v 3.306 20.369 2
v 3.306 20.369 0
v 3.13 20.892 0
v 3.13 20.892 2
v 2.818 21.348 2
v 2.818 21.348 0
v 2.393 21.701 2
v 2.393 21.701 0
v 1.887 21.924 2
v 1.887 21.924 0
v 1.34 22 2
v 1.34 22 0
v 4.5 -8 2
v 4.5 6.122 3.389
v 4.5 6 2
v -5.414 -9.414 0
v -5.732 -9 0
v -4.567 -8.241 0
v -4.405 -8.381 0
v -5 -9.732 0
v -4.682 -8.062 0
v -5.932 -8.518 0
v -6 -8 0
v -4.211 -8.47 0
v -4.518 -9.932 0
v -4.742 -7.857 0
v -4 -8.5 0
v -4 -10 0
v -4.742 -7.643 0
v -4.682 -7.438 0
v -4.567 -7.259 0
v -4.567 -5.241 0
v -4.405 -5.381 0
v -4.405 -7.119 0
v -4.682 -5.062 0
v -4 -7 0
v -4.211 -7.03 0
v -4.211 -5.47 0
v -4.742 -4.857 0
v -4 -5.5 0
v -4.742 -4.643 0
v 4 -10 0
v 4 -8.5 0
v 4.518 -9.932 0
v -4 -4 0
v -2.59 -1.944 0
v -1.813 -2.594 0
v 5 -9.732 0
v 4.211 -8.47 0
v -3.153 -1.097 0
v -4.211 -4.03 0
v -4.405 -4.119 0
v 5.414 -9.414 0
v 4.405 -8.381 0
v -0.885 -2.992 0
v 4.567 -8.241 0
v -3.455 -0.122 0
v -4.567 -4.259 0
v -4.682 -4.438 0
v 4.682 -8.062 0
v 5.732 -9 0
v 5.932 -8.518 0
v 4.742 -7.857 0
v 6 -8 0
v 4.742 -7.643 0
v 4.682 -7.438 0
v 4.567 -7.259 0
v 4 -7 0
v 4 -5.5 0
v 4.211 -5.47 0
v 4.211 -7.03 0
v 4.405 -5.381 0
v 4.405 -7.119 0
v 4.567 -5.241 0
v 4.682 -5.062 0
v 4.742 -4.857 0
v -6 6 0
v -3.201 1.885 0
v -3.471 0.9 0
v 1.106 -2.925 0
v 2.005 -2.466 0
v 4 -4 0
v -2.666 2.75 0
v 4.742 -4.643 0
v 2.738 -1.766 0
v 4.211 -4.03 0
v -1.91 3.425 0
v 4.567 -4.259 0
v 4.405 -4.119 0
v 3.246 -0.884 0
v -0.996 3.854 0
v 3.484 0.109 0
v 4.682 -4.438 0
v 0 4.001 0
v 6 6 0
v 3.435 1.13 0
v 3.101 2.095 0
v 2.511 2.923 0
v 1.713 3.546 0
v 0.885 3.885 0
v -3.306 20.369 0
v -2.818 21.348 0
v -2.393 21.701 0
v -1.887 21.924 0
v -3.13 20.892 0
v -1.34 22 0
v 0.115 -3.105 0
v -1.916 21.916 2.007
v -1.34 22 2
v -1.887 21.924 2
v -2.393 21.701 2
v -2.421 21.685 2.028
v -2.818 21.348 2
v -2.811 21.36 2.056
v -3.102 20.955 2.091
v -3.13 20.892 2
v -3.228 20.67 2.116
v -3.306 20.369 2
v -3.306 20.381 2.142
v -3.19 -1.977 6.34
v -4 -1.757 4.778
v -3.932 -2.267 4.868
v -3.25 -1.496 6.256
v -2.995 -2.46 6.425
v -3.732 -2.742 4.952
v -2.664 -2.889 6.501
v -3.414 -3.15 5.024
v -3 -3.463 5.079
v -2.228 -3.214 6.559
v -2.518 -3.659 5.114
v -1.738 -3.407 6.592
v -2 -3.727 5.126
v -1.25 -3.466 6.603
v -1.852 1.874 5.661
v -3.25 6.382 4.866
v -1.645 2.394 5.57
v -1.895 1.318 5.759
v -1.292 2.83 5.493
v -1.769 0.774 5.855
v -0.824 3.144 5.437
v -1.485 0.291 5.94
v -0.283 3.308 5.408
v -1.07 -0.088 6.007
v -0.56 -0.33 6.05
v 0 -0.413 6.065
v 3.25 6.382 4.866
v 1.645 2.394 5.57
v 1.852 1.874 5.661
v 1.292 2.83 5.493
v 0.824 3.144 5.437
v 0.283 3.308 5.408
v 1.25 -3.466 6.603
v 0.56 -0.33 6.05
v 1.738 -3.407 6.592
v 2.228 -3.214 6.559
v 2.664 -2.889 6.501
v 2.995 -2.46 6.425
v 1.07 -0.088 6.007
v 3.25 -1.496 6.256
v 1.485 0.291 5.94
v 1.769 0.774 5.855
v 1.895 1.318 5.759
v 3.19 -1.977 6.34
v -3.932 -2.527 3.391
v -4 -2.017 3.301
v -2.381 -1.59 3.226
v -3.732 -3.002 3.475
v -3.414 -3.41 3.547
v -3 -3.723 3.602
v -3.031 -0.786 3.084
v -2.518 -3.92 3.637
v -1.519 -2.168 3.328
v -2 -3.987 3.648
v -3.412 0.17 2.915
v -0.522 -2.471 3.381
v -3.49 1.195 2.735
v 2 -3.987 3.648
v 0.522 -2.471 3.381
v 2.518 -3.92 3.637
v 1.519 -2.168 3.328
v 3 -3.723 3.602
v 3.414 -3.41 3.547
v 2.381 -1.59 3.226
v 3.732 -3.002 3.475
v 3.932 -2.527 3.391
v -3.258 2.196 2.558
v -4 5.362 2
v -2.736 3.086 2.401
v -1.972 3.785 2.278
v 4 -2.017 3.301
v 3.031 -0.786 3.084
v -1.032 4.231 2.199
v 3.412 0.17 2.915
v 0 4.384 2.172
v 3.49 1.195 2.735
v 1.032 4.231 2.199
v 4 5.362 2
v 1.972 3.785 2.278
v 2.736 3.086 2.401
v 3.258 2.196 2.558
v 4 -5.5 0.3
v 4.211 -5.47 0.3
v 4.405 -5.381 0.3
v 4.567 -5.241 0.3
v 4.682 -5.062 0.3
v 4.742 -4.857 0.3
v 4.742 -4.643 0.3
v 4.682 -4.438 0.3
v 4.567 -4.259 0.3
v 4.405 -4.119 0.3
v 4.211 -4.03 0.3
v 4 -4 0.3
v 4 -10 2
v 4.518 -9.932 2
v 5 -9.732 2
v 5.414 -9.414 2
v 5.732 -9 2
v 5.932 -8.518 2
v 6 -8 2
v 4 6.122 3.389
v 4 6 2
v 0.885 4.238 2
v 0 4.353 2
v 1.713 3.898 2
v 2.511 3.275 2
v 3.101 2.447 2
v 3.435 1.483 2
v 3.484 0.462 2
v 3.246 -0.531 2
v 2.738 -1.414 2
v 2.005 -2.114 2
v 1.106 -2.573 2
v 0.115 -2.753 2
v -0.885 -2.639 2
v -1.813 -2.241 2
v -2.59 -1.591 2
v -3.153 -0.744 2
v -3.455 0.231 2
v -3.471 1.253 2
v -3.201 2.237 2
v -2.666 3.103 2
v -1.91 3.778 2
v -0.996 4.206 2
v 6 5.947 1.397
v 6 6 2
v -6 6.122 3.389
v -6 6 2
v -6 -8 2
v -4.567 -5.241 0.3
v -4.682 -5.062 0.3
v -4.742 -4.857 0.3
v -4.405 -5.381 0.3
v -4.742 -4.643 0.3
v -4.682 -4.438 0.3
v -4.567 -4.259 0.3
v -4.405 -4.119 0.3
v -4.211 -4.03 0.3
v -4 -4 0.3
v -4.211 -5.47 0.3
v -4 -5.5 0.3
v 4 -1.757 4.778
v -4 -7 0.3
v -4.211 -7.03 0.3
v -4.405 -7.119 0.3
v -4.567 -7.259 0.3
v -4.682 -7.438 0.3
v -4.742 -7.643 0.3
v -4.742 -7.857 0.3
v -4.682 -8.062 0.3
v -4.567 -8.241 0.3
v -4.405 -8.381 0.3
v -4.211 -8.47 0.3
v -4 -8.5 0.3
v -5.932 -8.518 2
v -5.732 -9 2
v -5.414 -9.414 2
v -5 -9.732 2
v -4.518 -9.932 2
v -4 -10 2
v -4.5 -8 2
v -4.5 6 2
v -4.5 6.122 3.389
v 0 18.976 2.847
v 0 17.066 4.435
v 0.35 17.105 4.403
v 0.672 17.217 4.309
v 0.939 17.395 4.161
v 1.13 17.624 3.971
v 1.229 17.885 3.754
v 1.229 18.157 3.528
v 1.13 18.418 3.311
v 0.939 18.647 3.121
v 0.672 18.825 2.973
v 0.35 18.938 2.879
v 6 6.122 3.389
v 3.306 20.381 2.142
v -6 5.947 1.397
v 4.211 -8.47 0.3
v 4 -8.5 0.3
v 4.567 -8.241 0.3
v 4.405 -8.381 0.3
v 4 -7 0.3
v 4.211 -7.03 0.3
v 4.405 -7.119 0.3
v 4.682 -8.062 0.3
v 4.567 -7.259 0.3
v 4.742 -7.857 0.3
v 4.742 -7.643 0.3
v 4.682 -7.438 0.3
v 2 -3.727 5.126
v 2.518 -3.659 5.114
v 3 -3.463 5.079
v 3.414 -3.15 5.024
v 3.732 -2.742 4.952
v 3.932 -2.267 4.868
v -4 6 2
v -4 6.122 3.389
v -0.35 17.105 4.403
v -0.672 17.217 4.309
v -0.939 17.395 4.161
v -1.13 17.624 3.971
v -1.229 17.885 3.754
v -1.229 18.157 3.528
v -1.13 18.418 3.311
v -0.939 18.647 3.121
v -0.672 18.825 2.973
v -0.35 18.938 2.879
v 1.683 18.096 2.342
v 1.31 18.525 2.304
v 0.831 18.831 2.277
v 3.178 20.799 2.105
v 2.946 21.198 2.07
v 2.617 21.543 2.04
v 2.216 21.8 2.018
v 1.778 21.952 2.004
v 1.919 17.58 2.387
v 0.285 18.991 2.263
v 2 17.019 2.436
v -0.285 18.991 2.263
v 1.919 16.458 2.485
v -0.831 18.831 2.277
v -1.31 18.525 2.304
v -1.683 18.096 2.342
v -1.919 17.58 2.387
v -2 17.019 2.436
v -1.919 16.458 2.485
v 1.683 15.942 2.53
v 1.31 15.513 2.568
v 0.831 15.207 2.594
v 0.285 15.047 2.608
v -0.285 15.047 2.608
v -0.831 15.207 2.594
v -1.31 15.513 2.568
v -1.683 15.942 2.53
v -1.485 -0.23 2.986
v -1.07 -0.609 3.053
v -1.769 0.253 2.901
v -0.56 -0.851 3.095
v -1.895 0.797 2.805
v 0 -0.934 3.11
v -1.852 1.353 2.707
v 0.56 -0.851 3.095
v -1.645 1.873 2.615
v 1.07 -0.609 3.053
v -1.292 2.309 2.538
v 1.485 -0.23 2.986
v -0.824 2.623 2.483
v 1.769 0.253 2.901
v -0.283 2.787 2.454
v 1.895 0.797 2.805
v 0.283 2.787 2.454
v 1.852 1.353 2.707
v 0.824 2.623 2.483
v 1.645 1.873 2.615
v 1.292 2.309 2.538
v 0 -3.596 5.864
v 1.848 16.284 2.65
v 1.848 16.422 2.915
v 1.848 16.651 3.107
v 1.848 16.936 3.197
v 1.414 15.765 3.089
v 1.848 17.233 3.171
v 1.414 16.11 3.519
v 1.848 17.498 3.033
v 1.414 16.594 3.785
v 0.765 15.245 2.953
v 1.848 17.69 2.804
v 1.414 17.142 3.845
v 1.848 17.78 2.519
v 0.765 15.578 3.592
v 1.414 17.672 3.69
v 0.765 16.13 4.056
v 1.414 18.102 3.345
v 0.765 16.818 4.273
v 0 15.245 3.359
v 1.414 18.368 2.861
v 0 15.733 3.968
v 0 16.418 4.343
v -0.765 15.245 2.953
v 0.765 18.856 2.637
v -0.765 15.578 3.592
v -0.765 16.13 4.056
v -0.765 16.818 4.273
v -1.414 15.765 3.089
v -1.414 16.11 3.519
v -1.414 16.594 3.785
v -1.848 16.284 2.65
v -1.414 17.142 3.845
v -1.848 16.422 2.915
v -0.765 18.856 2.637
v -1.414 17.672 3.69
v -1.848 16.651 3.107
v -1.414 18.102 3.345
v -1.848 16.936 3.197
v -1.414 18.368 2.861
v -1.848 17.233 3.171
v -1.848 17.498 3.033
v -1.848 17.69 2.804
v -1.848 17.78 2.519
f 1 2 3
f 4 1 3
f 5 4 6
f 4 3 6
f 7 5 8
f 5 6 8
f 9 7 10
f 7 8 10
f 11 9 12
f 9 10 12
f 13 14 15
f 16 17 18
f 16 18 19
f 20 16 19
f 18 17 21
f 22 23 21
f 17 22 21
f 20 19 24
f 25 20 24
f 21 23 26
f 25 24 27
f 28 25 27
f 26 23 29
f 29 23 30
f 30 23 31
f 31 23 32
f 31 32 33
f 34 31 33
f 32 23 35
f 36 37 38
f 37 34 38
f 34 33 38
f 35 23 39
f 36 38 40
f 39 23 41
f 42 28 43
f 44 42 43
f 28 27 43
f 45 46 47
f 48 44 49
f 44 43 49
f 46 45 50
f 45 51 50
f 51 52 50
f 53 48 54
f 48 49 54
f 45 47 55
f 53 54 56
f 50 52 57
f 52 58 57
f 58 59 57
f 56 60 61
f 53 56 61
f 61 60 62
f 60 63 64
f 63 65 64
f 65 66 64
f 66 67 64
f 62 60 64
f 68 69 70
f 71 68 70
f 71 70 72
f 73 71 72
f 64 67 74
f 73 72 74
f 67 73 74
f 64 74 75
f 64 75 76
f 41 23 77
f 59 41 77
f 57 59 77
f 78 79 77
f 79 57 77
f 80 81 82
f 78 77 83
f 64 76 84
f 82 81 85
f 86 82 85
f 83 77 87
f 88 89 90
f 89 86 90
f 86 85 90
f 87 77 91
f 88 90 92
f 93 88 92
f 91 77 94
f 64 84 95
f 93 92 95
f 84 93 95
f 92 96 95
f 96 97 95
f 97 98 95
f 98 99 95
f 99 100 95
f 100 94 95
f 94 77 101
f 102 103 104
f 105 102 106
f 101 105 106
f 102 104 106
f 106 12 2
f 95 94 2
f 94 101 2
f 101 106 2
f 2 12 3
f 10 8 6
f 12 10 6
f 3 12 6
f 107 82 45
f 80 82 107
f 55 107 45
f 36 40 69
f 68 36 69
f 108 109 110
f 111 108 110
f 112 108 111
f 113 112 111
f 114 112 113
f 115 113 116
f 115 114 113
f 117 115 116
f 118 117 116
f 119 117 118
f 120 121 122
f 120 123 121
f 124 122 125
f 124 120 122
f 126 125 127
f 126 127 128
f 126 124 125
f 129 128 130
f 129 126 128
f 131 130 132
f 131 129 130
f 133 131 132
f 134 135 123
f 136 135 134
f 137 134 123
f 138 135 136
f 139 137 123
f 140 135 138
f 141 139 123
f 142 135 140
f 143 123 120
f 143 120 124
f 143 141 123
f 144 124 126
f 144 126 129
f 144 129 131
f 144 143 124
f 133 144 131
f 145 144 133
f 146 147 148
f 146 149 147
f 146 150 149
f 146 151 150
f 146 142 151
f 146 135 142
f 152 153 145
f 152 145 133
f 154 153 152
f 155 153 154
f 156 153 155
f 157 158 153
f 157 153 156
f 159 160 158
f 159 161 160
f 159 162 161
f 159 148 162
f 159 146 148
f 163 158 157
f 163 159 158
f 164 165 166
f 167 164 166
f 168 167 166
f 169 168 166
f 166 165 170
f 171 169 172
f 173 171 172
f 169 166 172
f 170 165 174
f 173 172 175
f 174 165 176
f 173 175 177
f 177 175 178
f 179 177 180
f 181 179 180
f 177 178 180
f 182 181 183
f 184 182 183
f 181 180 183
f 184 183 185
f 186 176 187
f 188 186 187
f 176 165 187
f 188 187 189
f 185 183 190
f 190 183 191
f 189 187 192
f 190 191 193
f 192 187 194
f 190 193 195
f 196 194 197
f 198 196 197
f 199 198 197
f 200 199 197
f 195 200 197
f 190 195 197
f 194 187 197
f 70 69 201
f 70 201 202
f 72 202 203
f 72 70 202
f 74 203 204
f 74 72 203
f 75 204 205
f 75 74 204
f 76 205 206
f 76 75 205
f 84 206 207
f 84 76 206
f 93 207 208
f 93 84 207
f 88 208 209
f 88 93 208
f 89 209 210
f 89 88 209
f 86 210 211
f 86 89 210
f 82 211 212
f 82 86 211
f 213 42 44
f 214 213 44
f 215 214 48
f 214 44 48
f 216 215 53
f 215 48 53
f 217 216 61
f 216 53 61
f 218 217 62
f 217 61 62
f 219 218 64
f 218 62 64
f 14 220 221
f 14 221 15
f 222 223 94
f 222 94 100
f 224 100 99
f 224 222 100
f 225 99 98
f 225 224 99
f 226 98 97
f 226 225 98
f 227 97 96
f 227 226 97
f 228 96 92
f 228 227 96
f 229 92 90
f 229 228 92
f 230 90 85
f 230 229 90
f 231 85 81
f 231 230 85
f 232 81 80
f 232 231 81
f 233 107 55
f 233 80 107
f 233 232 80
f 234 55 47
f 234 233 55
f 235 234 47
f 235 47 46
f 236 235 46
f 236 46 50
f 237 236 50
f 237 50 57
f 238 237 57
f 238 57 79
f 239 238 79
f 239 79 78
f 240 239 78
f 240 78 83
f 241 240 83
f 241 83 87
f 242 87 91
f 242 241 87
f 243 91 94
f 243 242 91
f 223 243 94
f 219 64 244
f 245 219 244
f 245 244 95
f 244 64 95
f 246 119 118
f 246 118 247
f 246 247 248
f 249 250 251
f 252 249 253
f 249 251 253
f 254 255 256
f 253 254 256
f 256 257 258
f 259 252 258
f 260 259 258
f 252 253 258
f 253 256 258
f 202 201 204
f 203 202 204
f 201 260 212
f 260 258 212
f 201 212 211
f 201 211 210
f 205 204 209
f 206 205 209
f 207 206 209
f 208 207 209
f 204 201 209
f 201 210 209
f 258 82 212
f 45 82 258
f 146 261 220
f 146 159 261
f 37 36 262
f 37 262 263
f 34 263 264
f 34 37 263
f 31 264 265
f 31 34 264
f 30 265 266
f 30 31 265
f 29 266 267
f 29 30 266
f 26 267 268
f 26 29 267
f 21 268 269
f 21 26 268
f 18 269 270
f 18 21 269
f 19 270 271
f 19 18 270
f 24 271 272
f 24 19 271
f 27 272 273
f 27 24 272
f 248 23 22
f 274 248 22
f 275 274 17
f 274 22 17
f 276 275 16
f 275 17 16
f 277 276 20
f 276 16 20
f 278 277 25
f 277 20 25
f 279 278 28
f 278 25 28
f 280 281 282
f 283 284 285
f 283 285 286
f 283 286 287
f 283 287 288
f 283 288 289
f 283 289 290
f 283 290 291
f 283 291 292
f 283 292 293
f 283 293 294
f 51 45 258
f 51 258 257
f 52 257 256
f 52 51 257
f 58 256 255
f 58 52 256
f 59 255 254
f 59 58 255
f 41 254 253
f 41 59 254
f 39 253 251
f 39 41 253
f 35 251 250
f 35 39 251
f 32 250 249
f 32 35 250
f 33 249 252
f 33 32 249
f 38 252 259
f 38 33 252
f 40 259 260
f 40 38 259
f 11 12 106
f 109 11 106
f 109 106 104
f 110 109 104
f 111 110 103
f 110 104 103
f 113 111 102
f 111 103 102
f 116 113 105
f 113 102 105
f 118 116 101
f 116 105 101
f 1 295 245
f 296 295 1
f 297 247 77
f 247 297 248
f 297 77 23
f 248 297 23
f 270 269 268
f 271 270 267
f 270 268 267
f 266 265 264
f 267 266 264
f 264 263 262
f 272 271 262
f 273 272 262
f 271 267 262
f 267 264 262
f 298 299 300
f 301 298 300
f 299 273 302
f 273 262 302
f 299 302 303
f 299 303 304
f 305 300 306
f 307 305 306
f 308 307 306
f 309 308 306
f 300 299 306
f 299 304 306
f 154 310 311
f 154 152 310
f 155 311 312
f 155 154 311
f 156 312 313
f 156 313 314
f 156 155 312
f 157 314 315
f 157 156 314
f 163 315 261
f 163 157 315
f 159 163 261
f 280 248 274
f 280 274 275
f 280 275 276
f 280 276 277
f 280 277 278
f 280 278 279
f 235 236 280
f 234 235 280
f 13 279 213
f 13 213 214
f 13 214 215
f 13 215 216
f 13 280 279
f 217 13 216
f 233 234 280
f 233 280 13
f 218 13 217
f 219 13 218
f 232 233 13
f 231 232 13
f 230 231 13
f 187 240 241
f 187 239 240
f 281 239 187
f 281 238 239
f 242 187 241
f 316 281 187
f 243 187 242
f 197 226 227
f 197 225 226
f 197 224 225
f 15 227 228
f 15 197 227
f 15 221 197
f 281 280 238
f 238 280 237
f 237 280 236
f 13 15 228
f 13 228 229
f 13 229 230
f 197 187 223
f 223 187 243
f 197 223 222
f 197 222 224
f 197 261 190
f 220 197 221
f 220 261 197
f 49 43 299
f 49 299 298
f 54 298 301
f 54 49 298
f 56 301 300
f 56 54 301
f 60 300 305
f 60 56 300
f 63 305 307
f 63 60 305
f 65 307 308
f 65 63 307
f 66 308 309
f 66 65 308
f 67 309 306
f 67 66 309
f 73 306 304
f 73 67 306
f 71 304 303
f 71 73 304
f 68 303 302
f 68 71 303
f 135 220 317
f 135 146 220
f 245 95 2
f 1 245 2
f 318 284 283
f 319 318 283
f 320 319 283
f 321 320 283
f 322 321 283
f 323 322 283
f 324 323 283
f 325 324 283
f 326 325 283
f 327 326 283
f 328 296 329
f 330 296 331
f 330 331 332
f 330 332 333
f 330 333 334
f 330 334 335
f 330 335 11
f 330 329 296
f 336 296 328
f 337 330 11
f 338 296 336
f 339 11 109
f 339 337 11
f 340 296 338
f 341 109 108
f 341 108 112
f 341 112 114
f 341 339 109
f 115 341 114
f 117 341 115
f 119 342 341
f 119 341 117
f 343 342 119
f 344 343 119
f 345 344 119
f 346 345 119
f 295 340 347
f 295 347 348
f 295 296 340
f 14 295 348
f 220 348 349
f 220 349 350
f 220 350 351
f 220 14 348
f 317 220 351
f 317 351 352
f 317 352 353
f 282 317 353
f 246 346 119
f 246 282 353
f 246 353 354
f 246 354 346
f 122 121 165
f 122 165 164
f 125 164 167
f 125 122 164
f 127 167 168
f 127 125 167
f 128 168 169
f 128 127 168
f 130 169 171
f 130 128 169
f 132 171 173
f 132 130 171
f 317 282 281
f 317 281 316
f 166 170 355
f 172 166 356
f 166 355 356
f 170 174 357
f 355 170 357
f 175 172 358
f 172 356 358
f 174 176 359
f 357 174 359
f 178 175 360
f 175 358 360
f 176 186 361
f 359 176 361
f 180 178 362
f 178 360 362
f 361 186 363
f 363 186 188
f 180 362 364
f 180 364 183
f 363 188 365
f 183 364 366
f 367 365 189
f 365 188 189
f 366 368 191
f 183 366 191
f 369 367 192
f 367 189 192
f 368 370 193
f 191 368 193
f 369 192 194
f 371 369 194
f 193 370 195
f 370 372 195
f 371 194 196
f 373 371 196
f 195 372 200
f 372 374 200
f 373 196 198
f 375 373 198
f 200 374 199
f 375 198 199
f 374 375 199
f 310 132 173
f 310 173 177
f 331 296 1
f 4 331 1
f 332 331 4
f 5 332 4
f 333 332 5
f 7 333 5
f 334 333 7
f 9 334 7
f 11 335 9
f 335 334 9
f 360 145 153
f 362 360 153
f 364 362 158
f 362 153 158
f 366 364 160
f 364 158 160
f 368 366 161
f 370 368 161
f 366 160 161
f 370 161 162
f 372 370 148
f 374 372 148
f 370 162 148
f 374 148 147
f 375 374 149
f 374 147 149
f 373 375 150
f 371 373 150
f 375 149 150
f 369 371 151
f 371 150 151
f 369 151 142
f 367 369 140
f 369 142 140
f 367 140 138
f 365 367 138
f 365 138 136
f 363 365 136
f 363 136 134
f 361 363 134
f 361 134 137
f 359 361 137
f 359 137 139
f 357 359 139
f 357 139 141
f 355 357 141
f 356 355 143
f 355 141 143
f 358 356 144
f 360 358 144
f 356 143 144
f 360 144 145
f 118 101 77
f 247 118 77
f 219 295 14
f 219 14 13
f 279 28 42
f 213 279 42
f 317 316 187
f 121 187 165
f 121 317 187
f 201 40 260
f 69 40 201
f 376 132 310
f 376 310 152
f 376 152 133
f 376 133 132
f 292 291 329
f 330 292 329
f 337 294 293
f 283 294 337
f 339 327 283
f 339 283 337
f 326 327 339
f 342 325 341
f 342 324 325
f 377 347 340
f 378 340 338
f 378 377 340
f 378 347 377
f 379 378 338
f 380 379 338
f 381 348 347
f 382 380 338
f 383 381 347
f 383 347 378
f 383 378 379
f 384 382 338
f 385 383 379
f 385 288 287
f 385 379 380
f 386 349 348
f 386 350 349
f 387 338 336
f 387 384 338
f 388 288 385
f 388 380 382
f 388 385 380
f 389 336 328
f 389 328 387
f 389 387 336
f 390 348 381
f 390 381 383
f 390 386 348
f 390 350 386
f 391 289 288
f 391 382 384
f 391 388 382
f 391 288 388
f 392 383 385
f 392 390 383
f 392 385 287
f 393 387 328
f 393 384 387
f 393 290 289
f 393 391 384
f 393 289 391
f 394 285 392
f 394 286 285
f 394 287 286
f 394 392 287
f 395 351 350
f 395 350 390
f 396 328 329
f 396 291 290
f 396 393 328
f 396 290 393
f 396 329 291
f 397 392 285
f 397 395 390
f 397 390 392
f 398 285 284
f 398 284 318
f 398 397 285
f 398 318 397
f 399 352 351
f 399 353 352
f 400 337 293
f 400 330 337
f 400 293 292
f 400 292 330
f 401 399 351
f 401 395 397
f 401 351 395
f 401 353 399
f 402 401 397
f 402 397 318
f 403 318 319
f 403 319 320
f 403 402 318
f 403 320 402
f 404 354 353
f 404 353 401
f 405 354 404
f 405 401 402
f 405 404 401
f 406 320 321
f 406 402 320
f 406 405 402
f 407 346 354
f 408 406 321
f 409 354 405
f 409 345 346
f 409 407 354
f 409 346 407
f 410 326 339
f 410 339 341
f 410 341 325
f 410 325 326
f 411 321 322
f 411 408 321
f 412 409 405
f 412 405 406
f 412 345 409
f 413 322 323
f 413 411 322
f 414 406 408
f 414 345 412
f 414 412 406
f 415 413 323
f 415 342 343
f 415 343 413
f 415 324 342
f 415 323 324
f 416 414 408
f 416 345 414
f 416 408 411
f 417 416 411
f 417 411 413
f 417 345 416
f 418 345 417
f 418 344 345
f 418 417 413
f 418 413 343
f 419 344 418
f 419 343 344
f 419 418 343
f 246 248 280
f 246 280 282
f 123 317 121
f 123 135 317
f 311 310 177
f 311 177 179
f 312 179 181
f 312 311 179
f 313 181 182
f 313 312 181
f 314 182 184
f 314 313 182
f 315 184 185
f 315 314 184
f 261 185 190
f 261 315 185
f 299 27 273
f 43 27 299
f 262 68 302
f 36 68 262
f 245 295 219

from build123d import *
from build123d.topology import SkipClean

# Parameters (mm, degrees)
BOSS_EXTRUDE1_DEPTH     = 2
FINGERGRIP_DEPTH        = 0.3
BOSS_EXTRUDE2_DEPTH     = 2
REVOLVE1_ANGLE          = 180
CUT_EXTRUDE3_DEPTH      = 24.23093064
CUT_EXTRUDE3_DEPTH_BACK = 24.23093064
BOSS_EXTRUDE6_DEPTH     = 1.5
SKETCH24_R              = 1.9
SCREW_THREADS_DEPTH     = 3
SCREW_HEAD_REACH        = 24.63
SKETCH25_R              = 3.5
WALL1_DEPTH             = 1.5
WALL2_DEPTH             = 1.5


with BuildPart() as part:
    # Sketch1 → Boss-Extrude1 (new body)
    with BuildSketch(Plane.XY):
        with BuildLine():
            Line((-4, -10), (4, -10))
            ThreePointArc((4, -10), (5.414213562, -9.414213562), (6, -8))
            Line((6, -8), (6, 6))
            Line((6, 6), (3.305891799, 20.36857707))
            ThreePointArc((3.305891799, 20.36857707), (2.6174191, 21.539018216), (1.340147425, 22))
            Line((1.340147425, 22), (-1.340147425, 22))
            ThreePointArc((-1.340147425, 22), (-2.6174191, 21.539018216), (-3.305891799, 20.36857707))
            Line((-3.305891799, 20.36857707), (-6, 6))
            Line((-6, 6), (-6, -8))
            ThreePointArc((-6, -8), (-5.414213562, -9.414213562), (-4, -10))
        make_face()
    extrude(amount=BOSS_EXTRUDE1_DEPTH)

    # Sketch8 → FingerGrip (cut)
    with BuildSketch(Plane(origin=(0, 0, 0), x_dir=(-1, 0, 0), z_dir=(0, 0, -1))):
        with BuildLine():
            Line((-4, -4), (4, -4))
            ThreePointArc((4, -4), (4.75, -4.75), (4, -5.5))
            Line((4, -5.5), (-4, -5.5))
            ThreePointArc((-4, -5.5), (-4.75, -4.75), (-4, -4))
        make_face()
        with BuildLine():
            Line((-4, -7), (4, -7))
            ThreePointArc((4, -7), (4.75, -7.75), (4, -8.5))
            Line((4, -8.5), (-4, -8.5))
            ThreePointArc((-4, -8.5), (-4.75, -7.75), (-4, -7))
        make_face()
    extrude(amount=-FINGERGRIP_DEPTH, mode=Mode.SUBTRACT)

    # Sketch2 → Boss-Extrude2 (add)
    with BuildSketch(Plane(origin=(0, 0.340762895, 3.894937707), x_dir=(-1, 0, 0), z_dir=(0, 0.08715574274765835, 0.9961946980917455))):
        with BuildLine():
            Line((6, -5.802856703), (-6, -5.802856703))
            Line((-6, -5.802856703), (-3.305891799, -20.116756999))
            add(Edge.make_bspline(
                [(-3.305891799, -20.116756999), (-3, -21.741971873), (-1.340147425, -21.741971873)],
                knots=[3.326940604, 3.326940604, 3.326940604, 4.71238898, 4.71238898, 4.71238898], degree=2, weights=[1, 0.769509108, 1]))
            Line((-1.340147425, -21.741971873), (1.340147425, -21.741971873))
            add(Edge.make_bspline(
                [(1.340147425, -21.741971873), (3, -21.741971873), (3.305891799, -20.116756999)],
                knots=[4.71238898, 4.71238898, 4.71238898, 6.097837357, 6.097837357, 6.097837357], degree=2, weights=[1, 0.769509108, 1]))
            Line((3.305891799, -20.116756999), (6, -5.802856703))
        make_face()
    extrude(amount=-BOSS_EXTRUDE2_DEPTH)

    # Sketch9 → Revolve1 (revolve)
    with BuildSketch(Plane(origin=(0, 0.340762895, 3.894937707), x_dir=(1, 0, 0), z_dir=(0, 0.08715574274765836, 0.9961946980917457))):
        with BuildLine():
            Line((-2, 16.741971873), (2, 16.741971873))
            ThreePointArc((2, 16.741971873), (0, 14.741971873), (-2, 16.741971873))
        make_face()
    revolve(axis=Axis((0, 17.01902651, 2.435778714), (-1, 0, 0)), revolution_arc=REVOLVE1_ANGLE)

    # Sketch11 → Cut-Extrude3 (cut, two sides)
    with SkipClean():  # the faces are left unmerged after this step: merging them gives an invalid solid
        with BuildSketch(Plane(origin=(0, 0, 0), x_dir=(0, 0, -1), z_dir=(1, 0, 0))) as cut_extrude3_sk:
            Polygon((-4.435231088, 17.065826116), (-2.847274196, 18.976236633), (-5.75514434, 18.976236633), align=None)
        extrude(amount=CUT_EXTRUDE3_DEPTH, mode=Mode.SUBTRACT)
        extrude(cut_extrude3_sk.sketch, amount=-CUT_EXTRUDE3_DEPTH_BACK, mode=Mode.SUBTRACT)

    # Sketch17 → Boss-Extrude6 (add)
    with SkipClean():  # the faces are left unmerged after this step: merging them gives an invalid solid
        with BuildSketch(Plane(origin=(0, 0.764171798, 4.333833624), x_dir=(1, 0, 0), z_dir=(0, 0.1736481776669307, 0.984807753012208))):
            with BuildLine():
                Line((-4, 7.440012187), (-4, -2.559987813))
                ThreePointArc((-4, -2.559987813), (-3.414213562, -3.974201376), (-2, -4.559987813))
                Line((-2, -4.559987813), (2, -4.559987813))
                ThreePointArc((2, -4.559987813), (3.414213562, -3.974201376), (4, -2.559987813))
                Line((4, -2.559987813), (4, 7.440012187))
                Line((4, 7.440012187), (-4, 7.440012187))
            make_face()
        extrude(amount=-BOSS_EXTRUDE6_DEPTH)

    # Sketch23 for ChannelLoft → ChannelLoft section 0
    with SkipClean():  # the faces are left unmerged after this step: merging them gives an invalid solid
        with BuildSketch(Plane(origin=(0, 0.764171798, 4.333833624), x_dir=(1, 0, 0), z_dir=(0, 0.1736481776669307, 0.984807753012208))):
            with BuildLine():
                Line((-4, 5.440012187), (-4, -2.559987813))
                # circular arc as an exact rational Bezier (weights 1, cos(half-angle), 1)
                Bezier((-4, -2.559987813), (-4, -4.559987813), (-2, -4.559987813), weights=[1, 0.707106781, 1])
                Line((-2, -4.559987813), (2, -4.559987813))
                Bezier((2, -4.559987813), (4, -4.559987813), (4, -2.559987813), weights=[1, 0.707106781, 1])
                Line((4, -2.559987813), (4, 5.440012187))
                Line((4, 5.440012187), (-4, 5.440012187))
            make_face()
        # Sketch19 for ChannelLoft → ChannelLoft section 1
        with BuildSketch(Plane(origin=(0, 1.024644064, 5.811045254), x_dir=(1, 0, 0), z_dir=(0, 0.1736481776669307, 0.9848077530122081))):
            with BuildLine():
                Line((-3.25, 5.440012187), (-3.25, -2.559987813))
                Bezier((-3.25, -2.559987813), (-3.25, -4.559987813), (-1.25, -4.559987813), weights=[1, 0.707106781, 1])
                Line((-1.25, -4.559987813), (1.25, -4.559987813))
                Bezier((1.25, -4.559987813), (3.25, -4.559987813), (3.25, -2.559987813), weights=[1, 0.707106781, 1])
                Line((3.25, -2.559987813), (3.25, 5.440012187))
                Line((3.25, 5.440012187), (-3.25, 5.440012187))
            make_face()
        loft()

    # Sketch24 → Screw Threads (cut)
    with SkipClean():  # the faces are left unmerged after this step: merging them gives an invalid solid
        with BuildSketch(Plane(origin=(0, 1.024644064, 5.811045254), x_dir=(1, 0, 0), z_dir=(0, 0.17364817766693072, 0.9848077530122081))):
            with Locations(Location((0, 0.440012187, 0), (0, 0, 270))):
                Circle(SKETCH24_R)
        extrude(amount=-SCREW_THREADS_DEPTH, mode=Mode.SUBTRACT)

    # Screw Head: up to this plane
    with SkipClean():  # the faces are left unmerged after this step: merging them gives an invalid solid
        screw_head_end = Plane(origin=(1.340147425, 20, 0), z_dir=(0, 0, 1))
        # Sketch25 → Screw Head (cut, up to the surface)
        with BuildSketch(Plane(origin=(0, 0.503699531, 2.856621995), x_dir=(-1, 0, 0), z_dir=(0, -0.1736481776669307, -0.9848077530122081)), mode=Mode.PRIVATE) as screw_head_sk1:
            with Locations(Location((0, 0.440012187, 0), (0, 0, 90))):
                Circle(SKETCH25_R)
        screw_head_tool1 = split(extrude(screw_head_sk1.sketch, amount=SCREW_HEAD_REACH, mode=Mode.PRIVATE), bisect_by=screw_head_end, keep=Keep.BOTH, mode=Mode.PRIVATE)
        add(screw_head_tool1.solids().sort_by_distance((0, 0.937027, 2.780215))[0], mode=Mode.SUBTRACT)

    # Sketch26 → Wall1 (add)
    with SkipClean():  # the faces are left unmerged after this step: merging them gives an invalid solid
        with BuildSketch(Plane(origin=(6, 0, 0), x_dir=(0, 0, -1), z_dir=(1, 0, 0))):
            Polygon((-2, 6), (-3.389185421, 6.121537976), (-2, -8), align=None)
        extrude(amount=-WALL1_DEPTH)

    # Sketch27 → Wall2 (add)
    with SkipClean():  # the faces are left unmerged after this step: merging them gives an invalid solid
        with BuildSketch(Plane.ZY.offset(6)):
            Polygon((3.389185421, 6.121537976), (2, 6), (2, -8), align=None)
        extrude(amount=-WALL2_DEPTH)


solid = part.part
